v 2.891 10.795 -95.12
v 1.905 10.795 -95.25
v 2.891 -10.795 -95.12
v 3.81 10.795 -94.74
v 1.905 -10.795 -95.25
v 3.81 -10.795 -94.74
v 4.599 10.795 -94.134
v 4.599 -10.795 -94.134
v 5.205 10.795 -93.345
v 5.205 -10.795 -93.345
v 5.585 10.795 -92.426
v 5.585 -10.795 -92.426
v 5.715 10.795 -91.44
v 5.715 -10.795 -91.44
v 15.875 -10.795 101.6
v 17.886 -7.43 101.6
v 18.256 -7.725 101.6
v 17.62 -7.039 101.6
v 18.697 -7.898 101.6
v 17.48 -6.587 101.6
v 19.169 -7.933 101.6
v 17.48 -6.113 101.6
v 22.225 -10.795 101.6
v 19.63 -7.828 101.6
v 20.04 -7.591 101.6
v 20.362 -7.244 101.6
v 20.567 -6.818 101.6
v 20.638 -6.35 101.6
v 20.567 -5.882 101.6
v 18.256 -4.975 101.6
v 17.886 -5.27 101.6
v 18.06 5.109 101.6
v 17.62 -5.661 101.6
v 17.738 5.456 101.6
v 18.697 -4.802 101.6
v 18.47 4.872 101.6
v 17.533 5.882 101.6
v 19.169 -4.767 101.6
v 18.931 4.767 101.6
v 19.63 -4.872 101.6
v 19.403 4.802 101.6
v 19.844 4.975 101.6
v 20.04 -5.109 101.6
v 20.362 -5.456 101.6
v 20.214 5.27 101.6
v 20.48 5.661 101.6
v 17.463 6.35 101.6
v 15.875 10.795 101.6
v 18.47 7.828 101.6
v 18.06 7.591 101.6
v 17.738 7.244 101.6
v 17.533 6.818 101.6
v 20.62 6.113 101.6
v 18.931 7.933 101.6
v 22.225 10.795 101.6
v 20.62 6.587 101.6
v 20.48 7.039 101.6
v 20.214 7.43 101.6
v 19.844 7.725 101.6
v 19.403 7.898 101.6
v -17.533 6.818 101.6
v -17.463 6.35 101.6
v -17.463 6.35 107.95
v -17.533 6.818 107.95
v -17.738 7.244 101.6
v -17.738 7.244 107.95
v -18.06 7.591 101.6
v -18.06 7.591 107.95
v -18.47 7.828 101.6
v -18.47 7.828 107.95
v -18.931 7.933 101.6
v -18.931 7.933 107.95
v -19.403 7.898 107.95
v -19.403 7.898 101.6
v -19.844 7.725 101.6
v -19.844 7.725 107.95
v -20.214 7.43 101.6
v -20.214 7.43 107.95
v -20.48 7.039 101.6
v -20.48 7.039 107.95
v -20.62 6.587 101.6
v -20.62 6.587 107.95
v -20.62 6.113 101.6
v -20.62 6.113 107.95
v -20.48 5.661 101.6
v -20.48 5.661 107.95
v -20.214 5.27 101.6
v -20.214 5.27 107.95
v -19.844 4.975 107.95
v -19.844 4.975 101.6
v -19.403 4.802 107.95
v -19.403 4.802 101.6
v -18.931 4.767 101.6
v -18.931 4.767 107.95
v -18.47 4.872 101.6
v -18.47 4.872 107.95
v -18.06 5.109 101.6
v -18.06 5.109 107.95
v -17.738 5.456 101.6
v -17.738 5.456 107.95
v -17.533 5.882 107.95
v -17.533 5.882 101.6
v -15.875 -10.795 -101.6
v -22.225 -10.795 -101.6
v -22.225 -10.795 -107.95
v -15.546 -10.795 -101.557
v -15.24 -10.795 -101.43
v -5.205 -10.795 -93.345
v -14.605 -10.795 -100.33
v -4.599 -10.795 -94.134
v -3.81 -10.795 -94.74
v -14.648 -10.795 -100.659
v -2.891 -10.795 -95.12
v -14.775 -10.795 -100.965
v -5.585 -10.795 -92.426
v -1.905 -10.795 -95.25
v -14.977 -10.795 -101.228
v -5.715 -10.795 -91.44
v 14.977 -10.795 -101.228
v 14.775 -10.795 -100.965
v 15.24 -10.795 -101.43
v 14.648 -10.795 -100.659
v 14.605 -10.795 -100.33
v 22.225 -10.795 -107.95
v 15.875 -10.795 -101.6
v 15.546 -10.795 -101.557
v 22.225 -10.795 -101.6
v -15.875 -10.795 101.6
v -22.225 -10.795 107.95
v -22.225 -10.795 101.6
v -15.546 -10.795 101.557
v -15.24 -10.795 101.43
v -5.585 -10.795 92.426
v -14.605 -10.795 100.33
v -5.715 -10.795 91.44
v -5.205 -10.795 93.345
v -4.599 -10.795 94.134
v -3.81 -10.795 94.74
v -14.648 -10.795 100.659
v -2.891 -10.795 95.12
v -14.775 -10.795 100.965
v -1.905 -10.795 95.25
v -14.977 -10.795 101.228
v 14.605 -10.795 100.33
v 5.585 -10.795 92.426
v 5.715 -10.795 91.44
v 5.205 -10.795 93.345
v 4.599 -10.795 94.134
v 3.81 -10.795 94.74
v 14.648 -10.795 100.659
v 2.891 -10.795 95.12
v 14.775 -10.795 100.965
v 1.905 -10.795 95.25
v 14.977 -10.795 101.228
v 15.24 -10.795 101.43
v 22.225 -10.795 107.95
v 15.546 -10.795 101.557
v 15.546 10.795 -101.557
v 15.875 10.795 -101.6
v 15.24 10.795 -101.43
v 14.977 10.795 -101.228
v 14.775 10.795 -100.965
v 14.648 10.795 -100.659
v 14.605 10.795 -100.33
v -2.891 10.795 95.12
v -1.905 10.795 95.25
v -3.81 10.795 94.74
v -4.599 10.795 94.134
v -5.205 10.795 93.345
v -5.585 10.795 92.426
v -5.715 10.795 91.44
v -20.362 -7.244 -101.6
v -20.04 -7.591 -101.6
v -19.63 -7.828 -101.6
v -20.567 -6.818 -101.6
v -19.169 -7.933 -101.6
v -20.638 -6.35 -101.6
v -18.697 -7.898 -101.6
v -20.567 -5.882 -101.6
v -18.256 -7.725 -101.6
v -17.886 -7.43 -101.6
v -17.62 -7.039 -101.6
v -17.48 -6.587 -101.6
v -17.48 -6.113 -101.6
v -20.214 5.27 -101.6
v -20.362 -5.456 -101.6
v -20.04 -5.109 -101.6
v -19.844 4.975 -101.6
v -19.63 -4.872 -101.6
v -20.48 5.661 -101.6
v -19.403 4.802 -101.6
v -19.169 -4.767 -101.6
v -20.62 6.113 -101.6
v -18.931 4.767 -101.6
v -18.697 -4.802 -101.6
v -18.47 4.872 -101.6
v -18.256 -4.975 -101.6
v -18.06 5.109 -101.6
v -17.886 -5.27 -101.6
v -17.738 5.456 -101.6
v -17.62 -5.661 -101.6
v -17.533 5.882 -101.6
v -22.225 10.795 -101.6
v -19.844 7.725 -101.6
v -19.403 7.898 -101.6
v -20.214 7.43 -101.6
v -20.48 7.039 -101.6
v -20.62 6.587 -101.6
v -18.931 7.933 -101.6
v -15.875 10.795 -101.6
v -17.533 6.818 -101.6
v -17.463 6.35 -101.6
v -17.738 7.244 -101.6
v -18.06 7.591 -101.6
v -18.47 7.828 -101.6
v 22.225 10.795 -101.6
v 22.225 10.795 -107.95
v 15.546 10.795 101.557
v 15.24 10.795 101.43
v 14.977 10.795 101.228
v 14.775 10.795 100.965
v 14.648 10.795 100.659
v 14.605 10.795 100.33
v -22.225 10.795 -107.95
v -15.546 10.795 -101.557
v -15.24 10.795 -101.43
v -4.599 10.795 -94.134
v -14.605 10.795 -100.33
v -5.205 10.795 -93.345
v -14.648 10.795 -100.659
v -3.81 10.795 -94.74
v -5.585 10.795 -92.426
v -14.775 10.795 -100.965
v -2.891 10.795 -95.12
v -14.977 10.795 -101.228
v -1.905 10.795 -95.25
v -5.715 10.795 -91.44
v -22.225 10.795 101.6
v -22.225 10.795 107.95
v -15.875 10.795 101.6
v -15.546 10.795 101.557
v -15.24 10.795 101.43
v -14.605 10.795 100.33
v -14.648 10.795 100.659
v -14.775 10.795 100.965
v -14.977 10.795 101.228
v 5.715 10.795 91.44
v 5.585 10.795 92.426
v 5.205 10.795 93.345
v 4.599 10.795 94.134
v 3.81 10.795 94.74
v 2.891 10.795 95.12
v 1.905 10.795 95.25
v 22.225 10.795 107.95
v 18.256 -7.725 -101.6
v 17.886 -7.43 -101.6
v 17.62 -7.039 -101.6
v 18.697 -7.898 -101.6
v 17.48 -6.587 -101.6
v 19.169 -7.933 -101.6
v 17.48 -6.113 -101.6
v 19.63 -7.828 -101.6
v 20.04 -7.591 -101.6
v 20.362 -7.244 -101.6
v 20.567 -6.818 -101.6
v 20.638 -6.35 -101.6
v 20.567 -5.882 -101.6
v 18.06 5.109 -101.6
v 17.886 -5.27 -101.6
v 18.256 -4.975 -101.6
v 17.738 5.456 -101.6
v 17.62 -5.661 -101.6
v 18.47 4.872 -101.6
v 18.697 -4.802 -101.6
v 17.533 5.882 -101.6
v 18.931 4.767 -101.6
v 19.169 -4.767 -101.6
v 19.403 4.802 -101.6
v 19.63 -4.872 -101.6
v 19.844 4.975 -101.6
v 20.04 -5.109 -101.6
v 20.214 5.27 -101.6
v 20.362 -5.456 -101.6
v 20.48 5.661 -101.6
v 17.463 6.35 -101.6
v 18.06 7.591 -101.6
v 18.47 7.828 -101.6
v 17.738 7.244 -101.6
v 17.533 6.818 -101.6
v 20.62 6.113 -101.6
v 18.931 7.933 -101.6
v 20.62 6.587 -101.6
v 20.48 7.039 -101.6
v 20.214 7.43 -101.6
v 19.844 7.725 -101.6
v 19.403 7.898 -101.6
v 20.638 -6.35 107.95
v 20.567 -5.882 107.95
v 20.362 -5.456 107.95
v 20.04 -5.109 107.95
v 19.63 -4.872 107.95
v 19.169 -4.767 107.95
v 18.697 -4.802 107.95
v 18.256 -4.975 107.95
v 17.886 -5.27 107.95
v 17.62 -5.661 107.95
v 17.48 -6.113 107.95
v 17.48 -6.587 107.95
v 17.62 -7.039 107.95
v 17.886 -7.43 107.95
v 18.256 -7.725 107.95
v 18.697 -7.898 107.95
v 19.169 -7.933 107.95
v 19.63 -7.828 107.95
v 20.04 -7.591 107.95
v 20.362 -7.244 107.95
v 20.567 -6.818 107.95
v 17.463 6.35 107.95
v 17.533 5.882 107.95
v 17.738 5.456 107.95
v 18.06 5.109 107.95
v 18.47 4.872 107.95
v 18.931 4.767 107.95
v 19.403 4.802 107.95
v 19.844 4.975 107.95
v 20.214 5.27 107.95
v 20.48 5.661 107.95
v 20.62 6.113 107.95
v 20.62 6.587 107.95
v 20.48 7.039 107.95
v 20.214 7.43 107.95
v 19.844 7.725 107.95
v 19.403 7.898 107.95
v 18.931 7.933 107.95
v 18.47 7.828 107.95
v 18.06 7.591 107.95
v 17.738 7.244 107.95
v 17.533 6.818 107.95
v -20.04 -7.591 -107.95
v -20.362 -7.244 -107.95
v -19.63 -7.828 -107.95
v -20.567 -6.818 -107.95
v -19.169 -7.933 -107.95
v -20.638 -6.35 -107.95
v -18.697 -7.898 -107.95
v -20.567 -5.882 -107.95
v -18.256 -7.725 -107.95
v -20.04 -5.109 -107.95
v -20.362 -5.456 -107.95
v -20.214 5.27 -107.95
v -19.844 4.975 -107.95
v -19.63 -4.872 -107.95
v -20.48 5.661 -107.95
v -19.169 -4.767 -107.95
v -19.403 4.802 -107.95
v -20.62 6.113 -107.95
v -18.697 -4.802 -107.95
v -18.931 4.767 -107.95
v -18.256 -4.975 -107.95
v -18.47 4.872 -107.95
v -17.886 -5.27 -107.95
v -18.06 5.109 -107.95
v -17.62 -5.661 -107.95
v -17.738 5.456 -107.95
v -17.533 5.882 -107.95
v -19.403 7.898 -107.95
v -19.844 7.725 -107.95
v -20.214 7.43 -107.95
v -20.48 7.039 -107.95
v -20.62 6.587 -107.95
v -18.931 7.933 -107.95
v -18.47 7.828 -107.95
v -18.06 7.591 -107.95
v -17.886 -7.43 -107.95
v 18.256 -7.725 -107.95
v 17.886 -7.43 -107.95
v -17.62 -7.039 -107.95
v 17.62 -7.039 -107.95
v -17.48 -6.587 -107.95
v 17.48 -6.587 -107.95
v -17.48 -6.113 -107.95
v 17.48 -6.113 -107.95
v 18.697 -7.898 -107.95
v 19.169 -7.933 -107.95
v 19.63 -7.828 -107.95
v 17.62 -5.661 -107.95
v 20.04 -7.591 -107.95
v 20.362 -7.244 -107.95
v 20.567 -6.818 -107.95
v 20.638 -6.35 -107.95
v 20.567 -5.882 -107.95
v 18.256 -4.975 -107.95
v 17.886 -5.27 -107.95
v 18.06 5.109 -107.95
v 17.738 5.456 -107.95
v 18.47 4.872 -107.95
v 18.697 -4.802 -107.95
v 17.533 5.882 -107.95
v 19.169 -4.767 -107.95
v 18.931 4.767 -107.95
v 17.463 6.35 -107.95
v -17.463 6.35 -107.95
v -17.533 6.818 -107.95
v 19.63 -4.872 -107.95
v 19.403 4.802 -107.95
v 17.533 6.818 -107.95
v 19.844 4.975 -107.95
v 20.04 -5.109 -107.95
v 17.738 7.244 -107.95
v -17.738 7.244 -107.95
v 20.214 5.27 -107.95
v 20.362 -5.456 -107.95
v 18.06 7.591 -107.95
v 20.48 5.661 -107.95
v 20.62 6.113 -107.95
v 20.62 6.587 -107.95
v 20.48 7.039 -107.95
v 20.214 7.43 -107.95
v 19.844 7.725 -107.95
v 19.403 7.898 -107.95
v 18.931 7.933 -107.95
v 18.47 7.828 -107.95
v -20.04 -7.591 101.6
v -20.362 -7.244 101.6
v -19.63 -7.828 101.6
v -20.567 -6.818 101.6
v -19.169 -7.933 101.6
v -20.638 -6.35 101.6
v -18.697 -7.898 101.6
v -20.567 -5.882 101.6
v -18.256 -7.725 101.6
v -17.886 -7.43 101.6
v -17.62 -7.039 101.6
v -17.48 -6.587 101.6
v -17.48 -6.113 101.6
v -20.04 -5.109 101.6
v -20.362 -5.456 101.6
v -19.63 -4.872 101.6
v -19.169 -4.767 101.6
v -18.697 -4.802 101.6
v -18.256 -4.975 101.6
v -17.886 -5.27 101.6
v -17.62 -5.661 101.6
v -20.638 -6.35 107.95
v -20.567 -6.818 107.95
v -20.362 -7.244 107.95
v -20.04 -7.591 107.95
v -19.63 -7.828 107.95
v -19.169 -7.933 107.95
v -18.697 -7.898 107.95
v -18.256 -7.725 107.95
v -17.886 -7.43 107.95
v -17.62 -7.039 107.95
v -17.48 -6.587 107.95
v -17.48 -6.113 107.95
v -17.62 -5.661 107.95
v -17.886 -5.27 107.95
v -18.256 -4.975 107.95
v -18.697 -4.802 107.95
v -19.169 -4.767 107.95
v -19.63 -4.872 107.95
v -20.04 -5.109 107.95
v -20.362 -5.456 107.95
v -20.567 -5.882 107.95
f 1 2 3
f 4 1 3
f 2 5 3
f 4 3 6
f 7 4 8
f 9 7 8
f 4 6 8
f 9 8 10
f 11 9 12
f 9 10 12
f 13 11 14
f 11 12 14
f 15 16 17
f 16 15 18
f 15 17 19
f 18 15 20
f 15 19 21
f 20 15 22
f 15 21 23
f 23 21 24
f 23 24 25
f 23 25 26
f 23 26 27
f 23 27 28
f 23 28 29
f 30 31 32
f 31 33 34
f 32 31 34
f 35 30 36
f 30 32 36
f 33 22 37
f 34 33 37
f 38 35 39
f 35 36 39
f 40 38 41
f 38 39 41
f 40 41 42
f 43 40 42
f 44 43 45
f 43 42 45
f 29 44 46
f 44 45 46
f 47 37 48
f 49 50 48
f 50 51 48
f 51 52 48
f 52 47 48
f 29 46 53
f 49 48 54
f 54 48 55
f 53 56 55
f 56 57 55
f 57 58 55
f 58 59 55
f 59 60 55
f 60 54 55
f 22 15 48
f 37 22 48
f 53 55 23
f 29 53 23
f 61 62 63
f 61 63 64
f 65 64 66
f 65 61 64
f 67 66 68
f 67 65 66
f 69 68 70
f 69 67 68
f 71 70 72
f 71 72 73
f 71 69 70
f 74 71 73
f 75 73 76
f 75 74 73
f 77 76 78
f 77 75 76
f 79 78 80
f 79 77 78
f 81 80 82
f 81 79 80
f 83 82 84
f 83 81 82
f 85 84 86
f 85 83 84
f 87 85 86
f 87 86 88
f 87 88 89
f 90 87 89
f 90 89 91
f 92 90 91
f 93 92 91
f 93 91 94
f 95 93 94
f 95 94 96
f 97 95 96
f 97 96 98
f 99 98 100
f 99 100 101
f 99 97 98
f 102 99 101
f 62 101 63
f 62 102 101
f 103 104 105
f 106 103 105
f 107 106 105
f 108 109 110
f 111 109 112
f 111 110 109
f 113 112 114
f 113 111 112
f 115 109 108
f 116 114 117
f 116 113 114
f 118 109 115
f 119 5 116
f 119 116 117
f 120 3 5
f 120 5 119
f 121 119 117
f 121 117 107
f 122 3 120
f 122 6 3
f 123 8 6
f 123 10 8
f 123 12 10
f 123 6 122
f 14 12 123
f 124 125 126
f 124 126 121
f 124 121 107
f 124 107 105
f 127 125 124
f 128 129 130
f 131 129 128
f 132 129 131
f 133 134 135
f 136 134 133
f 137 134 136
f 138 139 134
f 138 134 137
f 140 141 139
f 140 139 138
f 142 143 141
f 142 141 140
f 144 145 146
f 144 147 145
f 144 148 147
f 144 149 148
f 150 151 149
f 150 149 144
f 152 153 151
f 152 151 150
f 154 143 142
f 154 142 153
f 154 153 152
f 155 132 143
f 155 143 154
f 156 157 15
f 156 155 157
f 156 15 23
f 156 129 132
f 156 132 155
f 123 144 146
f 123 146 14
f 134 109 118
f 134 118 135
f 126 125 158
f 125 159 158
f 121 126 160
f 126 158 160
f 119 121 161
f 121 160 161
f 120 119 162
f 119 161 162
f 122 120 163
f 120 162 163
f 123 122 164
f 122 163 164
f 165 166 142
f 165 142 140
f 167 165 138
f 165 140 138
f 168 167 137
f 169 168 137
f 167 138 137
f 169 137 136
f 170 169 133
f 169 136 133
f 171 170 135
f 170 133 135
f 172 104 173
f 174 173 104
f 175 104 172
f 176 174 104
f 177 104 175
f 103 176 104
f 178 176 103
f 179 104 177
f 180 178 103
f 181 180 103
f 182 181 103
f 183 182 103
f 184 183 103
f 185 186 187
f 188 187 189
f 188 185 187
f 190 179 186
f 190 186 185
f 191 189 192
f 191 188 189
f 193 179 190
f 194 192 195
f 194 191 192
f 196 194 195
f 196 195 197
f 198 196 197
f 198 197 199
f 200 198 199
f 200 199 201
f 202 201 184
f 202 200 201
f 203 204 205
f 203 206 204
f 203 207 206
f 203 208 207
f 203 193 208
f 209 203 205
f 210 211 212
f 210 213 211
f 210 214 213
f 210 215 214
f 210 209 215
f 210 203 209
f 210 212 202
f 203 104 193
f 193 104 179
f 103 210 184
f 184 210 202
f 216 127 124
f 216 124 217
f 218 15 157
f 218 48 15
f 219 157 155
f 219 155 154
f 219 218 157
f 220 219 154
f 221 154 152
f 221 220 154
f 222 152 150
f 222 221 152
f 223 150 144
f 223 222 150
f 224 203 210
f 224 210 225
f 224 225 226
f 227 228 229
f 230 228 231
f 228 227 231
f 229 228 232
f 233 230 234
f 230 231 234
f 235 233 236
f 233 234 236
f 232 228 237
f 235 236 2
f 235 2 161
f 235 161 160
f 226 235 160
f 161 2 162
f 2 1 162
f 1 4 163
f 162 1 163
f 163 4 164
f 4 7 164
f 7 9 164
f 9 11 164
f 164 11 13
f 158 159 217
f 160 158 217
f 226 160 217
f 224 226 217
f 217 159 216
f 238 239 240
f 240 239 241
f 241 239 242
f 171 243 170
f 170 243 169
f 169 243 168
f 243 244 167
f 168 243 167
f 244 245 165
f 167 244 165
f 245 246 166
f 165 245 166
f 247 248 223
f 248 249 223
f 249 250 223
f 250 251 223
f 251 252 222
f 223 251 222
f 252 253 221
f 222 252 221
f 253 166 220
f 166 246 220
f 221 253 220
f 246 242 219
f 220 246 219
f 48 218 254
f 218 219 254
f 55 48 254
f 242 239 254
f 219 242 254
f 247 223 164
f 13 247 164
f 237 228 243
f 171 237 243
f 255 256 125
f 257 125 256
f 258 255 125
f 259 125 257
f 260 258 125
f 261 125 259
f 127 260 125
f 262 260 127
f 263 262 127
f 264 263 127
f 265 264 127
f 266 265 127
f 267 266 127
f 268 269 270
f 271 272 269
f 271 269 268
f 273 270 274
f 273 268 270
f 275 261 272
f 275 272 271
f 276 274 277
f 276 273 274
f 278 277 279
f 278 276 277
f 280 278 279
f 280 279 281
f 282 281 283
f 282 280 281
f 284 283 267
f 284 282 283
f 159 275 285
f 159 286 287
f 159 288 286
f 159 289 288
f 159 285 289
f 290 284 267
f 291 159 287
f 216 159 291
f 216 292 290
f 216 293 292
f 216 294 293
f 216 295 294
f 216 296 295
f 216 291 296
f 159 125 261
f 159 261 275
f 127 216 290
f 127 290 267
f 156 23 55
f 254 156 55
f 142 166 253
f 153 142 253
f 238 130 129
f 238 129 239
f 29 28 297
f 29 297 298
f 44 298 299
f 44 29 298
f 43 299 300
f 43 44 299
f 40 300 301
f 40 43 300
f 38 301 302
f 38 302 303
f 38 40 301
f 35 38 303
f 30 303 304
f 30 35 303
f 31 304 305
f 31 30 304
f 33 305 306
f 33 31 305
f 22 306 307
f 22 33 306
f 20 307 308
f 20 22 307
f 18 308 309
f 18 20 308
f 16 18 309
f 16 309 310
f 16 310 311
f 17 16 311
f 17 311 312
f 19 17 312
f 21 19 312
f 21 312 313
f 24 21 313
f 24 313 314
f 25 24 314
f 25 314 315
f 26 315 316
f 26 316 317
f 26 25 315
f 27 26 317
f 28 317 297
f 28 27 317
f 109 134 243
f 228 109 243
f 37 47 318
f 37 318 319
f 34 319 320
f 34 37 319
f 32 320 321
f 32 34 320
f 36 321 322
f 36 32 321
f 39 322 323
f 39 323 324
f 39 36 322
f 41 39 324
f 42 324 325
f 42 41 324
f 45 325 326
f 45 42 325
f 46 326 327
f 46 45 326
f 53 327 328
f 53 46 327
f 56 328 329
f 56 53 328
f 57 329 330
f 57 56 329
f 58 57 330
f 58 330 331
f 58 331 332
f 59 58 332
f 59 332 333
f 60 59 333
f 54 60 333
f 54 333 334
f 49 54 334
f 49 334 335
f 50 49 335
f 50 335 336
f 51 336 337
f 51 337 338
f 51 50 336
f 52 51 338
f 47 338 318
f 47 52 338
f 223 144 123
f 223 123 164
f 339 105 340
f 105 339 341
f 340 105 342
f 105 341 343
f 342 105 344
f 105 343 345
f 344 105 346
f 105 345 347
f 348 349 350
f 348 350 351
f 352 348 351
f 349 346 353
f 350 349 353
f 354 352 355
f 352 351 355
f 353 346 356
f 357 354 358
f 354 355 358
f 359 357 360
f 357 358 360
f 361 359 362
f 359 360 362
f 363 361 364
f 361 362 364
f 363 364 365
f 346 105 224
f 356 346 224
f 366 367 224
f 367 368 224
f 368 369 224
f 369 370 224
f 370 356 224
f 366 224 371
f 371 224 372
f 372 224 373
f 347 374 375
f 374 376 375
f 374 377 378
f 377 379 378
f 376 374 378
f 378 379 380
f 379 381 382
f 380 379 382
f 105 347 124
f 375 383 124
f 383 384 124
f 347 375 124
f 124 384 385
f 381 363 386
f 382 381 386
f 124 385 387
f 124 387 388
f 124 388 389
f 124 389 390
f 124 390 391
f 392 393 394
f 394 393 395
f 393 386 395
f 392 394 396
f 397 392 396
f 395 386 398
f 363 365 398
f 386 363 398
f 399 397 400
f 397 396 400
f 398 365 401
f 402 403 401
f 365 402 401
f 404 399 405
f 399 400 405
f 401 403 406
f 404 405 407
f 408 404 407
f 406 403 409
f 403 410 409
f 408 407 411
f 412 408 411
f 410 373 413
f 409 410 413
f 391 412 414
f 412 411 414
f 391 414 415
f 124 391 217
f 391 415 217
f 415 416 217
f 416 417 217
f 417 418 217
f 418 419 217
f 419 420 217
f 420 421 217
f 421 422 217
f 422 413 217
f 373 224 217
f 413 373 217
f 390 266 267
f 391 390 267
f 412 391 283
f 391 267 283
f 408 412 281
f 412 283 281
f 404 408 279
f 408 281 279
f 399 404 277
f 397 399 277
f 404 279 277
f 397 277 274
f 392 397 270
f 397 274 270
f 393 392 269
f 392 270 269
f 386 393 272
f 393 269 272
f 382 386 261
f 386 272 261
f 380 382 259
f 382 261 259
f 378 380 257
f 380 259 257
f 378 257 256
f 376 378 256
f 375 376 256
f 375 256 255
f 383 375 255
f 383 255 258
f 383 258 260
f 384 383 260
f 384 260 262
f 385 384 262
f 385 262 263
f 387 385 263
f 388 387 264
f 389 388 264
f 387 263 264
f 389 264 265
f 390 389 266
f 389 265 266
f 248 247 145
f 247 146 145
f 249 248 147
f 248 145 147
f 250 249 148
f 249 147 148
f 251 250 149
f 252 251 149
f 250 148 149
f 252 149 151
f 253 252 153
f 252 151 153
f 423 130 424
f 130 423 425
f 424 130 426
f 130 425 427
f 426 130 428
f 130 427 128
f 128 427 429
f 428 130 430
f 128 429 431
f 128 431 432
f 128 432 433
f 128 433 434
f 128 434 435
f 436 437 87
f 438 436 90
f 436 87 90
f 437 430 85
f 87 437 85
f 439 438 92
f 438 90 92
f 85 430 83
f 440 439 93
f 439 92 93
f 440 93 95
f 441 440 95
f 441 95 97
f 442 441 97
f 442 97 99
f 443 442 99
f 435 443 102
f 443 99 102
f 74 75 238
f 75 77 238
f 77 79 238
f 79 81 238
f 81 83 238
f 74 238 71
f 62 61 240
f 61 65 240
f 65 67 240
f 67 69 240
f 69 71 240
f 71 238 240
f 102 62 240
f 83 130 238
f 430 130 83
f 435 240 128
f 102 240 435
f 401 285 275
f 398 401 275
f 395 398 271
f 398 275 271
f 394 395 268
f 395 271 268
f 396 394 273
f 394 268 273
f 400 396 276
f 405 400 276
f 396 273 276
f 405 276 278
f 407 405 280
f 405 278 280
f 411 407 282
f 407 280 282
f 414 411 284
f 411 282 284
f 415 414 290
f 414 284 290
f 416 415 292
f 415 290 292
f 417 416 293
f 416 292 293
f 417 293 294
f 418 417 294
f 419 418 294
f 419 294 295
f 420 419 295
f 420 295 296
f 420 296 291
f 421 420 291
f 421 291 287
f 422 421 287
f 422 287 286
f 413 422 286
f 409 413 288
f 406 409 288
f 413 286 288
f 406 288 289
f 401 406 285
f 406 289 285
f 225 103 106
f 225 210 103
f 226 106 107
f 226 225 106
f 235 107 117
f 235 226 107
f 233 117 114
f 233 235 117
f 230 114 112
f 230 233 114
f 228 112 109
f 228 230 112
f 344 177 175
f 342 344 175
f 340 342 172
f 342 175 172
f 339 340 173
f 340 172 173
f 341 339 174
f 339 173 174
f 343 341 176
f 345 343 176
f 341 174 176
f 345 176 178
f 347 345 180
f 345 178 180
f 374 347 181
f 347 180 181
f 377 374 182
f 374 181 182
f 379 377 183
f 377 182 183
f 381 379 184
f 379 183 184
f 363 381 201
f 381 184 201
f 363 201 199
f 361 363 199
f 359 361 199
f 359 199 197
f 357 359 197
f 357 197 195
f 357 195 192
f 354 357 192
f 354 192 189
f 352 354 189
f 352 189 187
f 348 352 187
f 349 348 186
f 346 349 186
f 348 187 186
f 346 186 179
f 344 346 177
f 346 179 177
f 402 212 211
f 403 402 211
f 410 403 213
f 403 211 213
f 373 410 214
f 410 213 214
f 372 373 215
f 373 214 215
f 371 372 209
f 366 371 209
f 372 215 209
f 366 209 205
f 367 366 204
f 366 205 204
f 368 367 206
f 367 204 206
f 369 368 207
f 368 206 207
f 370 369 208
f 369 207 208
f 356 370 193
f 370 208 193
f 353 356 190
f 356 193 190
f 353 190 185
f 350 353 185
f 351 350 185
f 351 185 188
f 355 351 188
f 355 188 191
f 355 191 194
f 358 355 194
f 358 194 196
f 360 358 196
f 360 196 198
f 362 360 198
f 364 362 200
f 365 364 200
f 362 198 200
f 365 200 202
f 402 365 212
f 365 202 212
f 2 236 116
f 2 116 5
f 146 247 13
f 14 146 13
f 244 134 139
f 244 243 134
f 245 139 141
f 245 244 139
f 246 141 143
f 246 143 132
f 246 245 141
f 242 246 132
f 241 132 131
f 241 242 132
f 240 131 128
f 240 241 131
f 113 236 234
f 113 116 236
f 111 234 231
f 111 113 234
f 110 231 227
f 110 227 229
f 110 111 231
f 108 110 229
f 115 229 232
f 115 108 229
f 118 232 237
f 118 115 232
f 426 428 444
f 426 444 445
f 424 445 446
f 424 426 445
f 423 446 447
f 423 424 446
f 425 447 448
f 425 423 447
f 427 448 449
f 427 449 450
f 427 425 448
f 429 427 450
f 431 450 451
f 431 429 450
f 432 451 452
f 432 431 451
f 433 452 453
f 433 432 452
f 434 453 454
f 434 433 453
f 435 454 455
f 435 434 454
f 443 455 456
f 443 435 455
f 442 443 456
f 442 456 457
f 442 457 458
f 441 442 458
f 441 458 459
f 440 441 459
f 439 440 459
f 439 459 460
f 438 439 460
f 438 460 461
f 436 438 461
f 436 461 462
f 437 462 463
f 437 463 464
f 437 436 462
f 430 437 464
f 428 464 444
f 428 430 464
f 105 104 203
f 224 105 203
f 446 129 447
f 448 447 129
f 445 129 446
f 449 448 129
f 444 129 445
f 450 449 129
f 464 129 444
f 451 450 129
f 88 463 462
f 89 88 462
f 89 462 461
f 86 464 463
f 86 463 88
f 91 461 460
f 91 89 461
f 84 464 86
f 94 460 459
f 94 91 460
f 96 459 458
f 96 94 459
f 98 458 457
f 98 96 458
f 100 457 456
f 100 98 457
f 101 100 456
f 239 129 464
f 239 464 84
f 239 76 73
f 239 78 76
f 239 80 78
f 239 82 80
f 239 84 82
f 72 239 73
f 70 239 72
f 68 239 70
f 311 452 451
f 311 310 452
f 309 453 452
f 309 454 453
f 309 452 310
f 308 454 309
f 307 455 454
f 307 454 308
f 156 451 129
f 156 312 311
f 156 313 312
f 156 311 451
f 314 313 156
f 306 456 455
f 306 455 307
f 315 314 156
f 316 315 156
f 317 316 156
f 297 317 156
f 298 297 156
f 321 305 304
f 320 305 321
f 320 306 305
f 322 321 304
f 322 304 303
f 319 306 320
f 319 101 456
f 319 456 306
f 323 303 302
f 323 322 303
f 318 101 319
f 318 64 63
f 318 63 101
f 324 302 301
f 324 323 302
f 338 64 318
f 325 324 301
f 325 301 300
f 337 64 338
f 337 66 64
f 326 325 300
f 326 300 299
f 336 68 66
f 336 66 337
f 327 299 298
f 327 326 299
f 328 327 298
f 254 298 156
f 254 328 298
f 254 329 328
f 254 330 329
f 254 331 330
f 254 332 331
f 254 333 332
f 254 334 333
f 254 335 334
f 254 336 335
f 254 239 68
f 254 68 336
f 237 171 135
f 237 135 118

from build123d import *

# Parameters (mm, degrees)
SKETCH1_W           = 29.21
SKETCH1_H           = 21.59
BOSS_EXTRUDE1_DEPTH = 101.6
SKETCH2_W           = 44.45
SKETCH2_H           = 21.59
SKETCH2_R           = 1.5875
BOSS_EXTRUDE2_DEPTH = 6.35
FILLET1_R           = 1.27
SKETCH3_W           = 11.43
SKETCH3_H           = 190.5
CUT_EXTRUDE1_DEPTH  = 113.3088653
FILLET2_R           = 3.81


with BuildPart() as part:
    # Sketch1 → Boss-Extrude1 (new, symmetric)
    with BuildSketch(Plane.XY):
        Rectangle(SKETCH1_W, SKETCH1_H)
    extrude(amount=BOSS_EXTRUDE1_DEPTH, both=True)

    # Sketch2 → Boss-Extrude2 (add)
    with BuildSketch(Plane.XY.offset(101.6)):
        Rectangle(SKETCH2_W, SKETCH2_H)
        with Locations((-19.05, 6.35)):
            Circle(SKETCH2_R, mode=Mode.SUBTRACT)
        with Locations(Location((-19.05, -6.35, 0), (0, 0, 180))):
            Circle(SKETCH2_R, mode=Mode.SUBTRACT)
        with Locations((19.05, -6.35)):
            Circle(SKETCH2_R, mode=Mode.SUBTRACT)
        with Locations(Location((19.05, 6.35, 0), (0, 0, 180))):
            Circle(SKETCH2_R, mode=Mode.SUBTRACT)
    boss_extrude2 = extrude(amount=BOSS_EXTRUDE2_DEPTH)

    # Mirror1: Boss-Extrude2 across plane
    add(boss_extrude2.mirror(Plane.XY))

    # Fillet1
    fillet1_edges = [part.edges().sort_by_distance(p)[0] for p in [
        (14.605, 0, 101.6),
        (-14.605, 0, 101.6),
        (14.605, 0, -101.6),
        (-14.605, 0, -101.6),
    ]]
    fillet(fillet1_edges, radius=FILLET1_R)

    # Sketch3 → Cut-Extrude1 (cut, through all)
    with BuildSketch(Plane(origin=(0, 10.795, 0), x_dir=(1, 0, 0), z_dir=(0, 1, 0))):
        Rectangle(SKETCH3_W, SKETCH3_H)
    extrude(amount=-CUT_EXTRUDE1_DEPTH, mode=Mode.SUBTRACT)

    # Fillet2
    fillet2_edges = [part.edges().sort_by_distance(p)[0] for p in [
        (-5.715, 0, -95.25),
        (5.715, 0, -95.25),
        (5.715, 0, 95.25),
        (-5.715, 0, 95.25),
    ]]
    fillet(fillet2_edges, radius=FILLET2_R)


solid = part.part
